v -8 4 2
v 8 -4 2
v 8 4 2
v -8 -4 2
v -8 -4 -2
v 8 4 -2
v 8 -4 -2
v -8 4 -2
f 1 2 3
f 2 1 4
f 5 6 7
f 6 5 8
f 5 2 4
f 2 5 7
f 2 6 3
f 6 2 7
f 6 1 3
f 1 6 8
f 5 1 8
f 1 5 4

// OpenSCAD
// Construct: scale() with a non-uniform factor.
scale([2, 1, 0.5]) cube(8, center = true);
